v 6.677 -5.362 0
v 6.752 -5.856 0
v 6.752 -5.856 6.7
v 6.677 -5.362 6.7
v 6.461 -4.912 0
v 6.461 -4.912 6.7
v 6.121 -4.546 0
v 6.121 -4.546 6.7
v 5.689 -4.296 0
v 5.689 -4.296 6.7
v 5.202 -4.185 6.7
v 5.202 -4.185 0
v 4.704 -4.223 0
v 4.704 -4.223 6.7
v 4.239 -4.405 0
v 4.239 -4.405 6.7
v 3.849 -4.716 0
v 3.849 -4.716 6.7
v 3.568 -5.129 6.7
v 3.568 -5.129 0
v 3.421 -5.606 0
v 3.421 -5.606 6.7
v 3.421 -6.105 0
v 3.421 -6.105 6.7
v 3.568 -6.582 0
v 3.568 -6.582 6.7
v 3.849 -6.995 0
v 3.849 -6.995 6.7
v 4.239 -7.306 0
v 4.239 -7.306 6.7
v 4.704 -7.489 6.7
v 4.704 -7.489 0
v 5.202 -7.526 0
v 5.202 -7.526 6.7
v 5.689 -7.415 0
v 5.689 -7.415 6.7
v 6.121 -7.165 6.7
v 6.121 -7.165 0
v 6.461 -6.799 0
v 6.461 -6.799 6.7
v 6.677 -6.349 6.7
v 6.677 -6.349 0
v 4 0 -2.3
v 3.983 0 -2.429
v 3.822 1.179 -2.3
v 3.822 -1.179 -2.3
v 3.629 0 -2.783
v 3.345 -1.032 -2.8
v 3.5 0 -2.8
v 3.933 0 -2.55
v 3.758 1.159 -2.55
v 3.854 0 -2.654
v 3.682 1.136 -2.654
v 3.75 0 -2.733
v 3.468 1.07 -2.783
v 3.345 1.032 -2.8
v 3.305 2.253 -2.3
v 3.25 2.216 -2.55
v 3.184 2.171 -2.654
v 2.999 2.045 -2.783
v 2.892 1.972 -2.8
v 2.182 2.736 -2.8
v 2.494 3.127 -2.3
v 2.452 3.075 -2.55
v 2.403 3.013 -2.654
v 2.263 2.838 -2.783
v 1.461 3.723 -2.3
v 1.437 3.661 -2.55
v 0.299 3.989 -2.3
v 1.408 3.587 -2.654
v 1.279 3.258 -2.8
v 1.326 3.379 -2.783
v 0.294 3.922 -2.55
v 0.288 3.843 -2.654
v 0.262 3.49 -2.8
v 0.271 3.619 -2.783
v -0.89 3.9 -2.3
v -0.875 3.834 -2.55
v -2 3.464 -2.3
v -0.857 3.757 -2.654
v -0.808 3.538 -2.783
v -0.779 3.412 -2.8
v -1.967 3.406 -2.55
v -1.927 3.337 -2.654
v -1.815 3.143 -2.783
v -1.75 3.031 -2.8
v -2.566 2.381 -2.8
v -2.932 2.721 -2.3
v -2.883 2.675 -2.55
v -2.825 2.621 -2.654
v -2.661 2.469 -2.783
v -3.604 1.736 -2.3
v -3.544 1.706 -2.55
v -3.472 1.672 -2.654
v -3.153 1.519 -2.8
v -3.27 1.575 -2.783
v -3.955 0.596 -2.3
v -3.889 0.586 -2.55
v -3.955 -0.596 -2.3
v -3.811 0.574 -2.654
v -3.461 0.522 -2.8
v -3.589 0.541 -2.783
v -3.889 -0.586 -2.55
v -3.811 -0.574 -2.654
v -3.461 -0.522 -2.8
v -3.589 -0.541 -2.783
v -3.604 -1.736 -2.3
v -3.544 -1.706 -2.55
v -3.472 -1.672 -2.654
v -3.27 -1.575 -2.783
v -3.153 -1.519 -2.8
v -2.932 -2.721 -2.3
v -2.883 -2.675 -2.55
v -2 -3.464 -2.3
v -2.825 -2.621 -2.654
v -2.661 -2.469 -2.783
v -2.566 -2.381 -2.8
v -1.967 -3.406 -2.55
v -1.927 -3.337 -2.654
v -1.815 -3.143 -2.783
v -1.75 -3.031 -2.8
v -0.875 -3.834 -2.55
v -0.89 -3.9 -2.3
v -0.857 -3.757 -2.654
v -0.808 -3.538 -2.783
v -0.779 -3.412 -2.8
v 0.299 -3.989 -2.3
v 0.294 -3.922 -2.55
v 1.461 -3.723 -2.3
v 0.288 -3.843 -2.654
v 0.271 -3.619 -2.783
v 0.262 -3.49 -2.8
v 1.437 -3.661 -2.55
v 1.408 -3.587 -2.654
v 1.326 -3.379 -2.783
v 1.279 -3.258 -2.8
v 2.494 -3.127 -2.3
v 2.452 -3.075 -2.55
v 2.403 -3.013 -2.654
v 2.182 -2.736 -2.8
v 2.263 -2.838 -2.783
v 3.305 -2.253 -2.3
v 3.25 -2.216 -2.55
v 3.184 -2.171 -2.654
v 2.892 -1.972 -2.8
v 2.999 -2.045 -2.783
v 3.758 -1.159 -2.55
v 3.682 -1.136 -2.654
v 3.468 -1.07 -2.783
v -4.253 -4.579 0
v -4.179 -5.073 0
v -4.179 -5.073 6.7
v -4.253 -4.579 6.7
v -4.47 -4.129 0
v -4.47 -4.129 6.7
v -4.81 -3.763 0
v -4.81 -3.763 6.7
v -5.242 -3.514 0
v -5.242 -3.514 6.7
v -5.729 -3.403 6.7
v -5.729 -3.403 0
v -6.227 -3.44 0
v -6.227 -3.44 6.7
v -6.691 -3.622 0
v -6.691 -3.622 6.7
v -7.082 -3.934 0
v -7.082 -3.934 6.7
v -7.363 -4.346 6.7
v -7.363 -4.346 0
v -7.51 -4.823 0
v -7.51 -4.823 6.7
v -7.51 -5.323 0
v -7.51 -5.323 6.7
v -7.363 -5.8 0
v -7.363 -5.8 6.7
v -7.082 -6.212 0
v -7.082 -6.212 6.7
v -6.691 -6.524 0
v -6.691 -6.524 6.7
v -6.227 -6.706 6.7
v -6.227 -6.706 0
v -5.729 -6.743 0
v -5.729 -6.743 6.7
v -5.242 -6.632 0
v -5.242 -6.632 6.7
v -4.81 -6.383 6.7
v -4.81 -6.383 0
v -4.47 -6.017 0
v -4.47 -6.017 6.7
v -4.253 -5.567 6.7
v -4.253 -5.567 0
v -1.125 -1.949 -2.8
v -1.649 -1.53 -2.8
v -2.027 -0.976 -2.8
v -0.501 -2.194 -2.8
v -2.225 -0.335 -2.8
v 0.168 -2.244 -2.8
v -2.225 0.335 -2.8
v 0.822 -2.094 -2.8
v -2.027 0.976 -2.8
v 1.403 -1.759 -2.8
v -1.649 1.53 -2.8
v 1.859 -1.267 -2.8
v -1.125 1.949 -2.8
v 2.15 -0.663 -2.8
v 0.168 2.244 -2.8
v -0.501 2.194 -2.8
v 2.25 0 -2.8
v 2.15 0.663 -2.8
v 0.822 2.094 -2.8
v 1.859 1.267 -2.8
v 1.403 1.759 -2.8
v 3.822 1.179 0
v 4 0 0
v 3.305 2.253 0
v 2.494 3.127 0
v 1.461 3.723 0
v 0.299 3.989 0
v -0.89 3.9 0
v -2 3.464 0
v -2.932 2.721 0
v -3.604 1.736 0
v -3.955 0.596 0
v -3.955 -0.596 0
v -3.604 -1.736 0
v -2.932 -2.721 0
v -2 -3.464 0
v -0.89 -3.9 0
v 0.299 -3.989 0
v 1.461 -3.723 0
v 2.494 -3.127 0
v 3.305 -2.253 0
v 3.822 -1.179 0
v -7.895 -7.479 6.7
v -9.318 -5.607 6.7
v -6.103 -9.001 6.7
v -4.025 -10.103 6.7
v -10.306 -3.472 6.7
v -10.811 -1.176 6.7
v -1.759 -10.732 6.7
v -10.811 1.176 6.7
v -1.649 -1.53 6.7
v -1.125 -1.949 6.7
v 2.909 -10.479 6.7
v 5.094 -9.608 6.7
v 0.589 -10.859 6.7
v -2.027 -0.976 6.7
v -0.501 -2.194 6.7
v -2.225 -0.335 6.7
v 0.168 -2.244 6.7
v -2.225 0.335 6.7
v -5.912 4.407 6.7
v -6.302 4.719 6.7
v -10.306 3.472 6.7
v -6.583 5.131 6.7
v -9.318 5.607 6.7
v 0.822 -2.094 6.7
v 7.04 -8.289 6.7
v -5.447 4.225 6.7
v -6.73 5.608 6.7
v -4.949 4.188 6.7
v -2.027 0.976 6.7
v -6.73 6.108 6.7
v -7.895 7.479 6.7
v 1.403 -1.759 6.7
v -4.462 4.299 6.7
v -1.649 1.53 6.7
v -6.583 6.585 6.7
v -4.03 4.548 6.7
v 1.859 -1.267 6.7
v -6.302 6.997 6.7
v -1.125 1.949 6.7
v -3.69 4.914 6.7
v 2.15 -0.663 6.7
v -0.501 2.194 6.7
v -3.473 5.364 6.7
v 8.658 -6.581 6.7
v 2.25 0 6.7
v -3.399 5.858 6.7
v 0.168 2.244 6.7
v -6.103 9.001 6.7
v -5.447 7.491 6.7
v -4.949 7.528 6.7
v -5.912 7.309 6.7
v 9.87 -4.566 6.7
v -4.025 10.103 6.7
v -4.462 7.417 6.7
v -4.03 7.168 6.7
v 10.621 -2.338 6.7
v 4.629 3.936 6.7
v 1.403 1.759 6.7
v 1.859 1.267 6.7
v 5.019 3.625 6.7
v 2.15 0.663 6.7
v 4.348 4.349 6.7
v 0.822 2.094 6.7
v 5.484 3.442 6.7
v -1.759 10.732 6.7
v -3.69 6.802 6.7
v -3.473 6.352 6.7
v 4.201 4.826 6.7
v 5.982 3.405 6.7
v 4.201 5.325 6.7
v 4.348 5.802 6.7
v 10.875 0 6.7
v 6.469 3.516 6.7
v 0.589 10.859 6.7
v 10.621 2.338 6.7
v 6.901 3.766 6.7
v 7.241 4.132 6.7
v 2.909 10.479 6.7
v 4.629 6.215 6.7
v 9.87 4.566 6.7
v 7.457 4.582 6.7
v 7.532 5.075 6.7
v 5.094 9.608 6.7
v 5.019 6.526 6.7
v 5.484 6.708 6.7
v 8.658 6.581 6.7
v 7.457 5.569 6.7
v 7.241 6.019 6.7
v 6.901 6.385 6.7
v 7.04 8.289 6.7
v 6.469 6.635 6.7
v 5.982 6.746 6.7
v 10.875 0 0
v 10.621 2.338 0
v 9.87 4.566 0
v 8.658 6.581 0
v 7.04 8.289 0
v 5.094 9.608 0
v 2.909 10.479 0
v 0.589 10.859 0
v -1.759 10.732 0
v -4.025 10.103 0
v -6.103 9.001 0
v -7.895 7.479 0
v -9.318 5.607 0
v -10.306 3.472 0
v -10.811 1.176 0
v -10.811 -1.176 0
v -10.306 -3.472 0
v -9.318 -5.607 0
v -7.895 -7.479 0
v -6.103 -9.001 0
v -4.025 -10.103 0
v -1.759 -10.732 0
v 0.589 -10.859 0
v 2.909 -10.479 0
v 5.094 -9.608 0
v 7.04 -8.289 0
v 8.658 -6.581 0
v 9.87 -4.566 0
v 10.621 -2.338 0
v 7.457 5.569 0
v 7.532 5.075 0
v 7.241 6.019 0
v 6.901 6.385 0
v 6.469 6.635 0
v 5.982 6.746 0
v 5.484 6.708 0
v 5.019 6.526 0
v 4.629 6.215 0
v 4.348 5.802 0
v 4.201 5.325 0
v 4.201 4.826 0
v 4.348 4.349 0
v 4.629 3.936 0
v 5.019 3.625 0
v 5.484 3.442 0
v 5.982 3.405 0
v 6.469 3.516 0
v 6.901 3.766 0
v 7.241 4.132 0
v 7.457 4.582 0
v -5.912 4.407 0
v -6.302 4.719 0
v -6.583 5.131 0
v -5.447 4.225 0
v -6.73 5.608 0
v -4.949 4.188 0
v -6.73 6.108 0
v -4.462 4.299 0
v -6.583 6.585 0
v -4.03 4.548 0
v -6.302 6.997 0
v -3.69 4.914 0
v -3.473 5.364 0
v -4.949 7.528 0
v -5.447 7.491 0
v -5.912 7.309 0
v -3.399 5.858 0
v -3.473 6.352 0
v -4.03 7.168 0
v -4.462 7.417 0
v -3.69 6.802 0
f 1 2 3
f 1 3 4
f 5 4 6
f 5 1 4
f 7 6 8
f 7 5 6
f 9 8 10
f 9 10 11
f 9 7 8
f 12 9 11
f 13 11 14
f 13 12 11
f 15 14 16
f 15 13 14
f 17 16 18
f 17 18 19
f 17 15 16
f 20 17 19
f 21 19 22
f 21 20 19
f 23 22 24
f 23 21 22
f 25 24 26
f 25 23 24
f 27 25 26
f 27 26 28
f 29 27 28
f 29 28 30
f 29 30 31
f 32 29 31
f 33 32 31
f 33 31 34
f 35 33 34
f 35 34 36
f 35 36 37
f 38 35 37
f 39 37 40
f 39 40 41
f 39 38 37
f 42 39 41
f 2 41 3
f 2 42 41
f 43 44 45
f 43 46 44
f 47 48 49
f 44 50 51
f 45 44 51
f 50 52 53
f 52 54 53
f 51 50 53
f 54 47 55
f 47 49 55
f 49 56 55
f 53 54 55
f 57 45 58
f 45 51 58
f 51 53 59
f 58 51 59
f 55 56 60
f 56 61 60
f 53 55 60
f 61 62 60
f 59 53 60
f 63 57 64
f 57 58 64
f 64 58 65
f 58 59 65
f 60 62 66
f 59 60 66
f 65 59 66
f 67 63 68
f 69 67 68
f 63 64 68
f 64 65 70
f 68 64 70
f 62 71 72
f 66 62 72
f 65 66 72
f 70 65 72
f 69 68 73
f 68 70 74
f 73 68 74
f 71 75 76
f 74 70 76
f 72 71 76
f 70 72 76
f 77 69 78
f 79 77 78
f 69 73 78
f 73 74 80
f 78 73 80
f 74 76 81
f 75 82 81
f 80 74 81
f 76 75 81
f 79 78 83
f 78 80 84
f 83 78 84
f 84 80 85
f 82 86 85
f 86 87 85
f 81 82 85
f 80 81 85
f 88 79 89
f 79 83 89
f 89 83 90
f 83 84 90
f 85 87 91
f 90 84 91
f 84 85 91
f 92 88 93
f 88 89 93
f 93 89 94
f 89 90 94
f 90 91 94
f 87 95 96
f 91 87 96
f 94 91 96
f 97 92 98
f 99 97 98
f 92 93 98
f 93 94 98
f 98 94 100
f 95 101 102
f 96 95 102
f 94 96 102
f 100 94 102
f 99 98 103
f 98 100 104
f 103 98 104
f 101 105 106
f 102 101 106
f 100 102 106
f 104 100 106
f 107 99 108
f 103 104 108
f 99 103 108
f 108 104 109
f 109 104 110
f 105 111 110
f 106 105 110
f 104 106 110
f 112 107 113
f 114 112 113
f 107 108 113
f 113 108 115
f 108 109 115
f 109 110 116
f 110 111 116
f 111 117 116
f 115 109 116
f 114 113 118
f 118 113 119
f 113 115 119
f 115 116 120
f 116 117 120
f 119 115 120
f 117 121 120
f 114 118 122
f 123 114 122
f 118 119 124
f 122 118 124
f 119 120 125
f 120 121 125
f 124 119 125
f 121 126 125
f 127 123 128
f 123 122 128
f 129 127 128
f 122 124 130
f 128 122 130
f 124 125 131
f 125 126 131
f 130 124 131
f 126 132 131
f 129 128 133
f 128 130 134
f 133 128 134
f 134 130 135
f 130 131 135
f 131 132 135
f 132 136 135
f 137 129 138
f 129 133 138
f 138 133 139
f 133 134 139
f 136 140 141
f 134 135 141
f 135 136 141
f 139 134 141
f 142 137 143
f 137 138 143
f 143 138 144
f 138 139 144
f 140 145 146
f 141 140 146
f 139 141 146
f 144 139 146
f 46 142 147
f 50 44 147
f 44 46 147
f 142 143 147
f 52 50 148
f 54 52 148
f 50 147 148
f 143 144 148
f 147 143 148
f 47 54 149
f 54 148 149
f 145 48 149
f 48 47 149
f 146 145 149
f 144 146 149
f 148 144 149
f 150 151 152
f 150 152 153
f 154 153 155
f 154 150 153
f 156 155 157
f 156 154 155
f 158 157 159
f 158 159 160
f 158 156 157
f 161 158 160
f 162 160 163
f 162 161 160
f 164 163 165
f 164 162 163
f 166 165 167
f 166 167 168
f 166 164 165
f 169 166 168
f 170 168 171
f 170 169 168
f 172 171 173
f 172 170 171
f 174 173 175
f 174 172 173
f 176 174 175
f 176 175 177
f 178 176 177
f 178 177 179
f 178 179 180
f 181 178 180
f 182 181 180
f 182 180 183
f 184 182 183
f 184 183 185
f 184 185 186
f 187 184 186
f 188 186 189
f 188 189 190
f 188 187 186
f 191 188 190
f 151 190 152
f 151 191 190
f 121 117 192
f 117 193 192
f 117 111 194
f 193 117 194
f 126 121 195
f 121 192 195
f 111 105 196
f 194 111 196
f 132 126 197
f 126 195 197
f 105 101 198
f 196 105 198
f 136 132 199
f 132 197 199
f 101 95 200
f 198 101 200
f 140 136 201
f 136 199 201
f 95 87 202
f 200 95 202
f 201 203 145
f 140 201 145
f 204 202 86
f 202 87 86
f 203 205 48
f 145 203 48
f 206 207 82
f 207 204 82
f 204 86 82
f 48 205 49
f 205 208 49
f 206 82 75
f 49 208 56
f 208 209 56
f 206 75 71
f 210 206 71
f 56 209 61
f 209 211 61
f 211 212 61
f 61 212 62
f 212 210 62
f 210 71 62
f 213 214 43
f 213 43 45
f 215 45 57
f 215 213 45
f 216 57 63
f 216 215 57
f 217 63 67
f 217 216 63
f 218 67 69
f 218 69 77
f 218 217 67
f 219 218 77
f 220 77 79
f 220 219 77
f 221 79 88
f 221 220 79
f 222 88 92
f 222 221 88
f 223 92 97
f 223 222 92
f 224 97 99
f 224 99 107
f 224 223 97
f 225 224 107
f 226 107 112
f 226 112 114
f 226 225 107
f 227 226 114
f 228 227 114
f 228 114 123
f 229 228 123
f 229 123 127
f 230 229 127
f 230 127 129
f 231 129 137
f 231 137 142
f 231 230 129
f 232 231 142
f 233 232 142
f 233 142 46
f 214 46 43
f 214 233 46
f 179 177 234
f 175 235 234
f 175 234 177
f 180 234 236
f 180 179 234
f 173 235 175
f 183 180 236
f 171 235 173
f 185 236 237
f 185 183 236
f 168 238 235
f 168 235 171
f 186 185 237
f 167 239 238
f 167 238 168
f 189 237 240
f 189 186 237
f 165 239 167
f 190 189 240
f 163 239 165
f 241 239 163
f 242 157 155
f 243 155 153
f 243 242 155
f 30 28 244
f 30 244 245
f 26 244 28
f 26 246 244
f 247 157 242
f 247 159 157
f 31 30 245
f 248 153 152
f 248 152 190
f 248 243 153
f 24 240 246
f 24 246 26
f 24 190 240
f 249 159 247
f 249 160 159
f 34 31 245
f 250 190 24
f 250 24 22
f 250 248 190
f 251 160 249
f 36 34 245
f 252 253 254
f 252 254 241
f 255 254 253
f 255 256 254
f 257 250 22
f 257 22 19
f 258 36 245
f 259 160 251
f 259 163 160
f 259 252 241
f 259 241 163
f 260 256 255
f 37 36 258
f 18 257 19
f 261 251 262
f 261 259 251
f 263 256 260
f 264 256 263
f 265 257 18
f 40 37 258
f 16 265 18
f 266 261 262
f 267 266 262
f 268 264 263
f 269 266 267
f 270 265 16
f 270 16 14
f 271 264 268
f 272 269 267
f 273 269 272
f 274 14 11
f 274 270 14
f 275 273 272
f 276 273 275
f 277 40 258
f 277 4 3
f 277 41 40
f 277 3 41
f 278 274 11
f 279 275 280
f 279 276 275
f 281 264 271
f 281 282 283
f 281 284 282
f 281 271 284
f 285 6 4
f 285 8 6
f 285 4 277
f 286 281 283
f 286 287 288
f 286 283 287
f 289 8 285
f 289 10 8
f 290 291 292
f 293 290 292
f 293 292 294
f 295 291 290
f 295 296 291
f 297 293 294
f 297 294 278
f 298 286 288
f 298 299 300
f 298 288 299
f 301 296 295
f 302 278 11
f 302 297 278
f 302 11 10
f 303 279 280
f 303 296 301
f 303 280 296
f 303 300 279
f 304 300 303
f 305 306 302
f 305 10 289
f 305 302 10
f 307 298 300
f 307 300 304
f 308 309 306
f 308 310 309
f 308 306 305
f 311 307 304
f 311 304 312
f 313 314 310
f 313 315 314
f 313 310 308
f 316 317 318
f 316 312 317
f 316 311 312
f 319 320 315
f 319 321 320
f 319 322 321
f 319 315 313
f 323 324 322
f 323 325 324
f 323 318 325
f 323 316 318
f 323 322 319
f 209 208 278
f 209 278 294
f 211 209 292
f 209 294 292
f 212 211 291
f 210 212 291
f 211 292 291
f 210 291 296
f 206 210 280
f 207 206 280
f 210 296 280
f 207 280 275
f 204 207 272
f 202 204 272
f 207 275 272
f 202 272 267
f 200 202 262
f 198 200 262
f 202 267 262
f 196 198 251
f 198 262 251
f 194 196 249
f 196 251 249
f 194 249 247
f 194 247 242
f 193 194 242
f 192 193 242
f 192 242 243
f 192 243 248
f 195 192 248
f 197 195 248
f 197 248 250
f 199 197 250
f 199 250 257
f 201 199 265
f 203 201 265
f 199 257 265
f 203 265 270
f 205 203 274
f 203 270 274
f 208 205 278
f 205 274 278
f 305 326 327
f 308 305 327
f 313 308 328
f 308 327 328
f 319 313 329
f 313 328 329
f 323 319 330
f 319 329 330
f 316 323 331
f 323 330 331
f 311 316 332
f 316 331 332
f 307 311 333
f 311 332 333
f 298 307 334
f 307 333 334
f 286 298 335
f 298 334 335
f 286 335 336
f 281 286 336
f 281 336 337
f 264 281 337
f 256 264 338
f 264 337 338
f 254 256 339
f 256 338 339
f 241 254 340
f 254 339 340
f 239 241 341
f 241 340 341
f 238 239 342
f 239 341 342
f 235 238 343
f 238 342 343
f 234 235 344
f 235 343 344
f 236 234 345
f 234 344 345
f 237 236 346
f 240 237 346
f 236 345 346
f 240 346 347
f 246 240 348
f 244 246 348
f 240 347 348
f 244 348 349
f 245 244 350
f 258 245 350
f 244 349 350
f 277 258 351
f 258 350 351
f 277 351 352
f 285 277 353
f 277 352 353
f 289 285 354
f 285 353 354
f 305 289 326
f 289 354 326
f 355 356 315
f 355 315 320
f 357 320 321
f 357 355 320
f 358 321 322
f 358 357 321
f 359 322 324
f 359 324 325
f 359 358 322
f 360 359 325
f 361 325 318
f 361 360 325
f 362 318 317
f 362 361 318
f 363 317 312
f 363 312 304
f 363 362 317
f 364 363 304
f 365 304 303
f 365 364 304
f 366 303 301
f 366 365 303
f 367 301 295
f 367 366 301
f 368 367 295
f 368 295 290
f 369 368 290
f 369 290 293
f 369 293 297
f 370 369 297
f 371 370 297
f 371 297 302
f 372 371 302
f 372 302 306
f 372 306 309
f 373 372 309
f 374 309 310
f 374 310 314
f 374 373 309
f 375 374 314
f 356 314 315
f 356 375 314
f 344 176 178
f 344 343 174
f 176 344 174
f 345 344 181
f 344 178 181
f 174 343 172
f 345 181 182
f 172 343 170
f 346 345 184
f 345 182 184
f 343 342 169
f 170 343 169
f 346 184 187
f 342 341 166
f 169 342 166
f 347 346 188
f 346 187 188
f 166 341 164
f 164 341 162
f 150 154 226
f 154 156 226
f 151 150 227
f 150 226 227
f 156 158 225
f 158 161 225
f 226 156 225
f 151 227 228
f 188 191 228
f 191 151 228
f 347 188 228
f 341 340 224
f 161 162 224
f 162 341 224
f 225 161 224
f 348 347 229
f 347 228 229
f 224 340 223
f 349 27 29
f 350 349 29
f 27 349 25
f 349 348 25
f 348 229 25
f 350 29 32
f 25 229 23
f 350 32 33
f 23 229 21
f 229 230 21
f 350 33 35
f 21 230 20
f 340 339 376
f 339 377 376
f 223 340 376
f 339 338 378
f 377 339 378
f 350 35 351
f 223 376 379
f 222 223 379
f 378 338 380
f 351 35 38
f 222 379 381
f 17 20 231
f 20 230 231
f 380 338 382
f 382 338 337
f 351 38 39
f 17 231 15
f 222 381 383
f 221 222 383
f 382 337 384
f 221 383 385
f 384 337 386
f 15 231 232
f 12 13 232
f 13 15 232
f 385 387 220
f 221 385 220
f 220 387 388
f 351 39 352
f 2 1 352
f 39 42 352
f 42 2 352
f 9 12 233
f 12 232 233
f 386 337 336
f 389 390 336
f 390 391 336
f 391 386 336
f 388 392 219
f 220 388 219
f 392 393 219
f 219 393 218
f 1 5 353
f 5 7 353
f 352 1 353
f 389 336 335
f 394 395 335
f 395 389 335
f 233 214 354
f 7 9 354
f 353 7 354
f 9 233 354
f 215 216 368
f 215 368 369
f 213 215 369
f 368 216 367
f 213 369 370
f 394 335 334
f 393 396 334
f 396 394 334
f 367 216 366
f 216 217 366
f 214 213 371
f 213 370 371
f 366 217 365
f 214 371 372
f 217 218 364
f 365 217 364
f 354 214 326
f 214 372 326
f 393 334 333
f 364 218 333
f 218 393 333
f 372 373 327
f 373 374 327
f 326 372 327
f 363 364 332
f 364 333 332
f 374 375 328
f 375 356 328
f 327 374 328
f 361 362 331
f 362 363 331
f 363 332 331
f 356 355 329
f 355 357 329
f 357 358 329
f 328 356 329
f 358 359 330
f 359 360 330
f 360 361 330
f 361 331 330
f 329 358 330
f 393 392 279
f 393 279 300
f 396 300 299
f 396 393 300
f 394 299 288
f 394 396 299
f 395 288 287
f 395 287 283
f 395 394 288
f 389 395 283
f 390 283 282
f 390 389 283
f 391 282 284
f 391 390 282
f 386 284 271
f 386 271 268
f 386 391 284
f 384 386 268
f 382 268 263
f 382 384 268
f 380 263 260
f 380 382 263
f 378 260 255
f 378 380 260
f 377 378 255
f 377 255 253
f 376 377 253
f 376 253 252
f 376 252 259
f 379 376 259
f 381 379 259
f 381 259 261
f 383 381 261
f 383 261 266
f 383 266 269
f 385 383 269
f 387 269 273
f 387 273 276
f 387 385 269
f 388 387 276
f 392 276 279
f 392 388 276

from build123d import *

# Parameters (mm, degrees)
F0_R     = 10.875
F0_R_2   = 1.675
F1_DEPTH = 6.7
F2_R     = 4
F3_DEPTH = 2.8
F4_R     = 2.25
F5_DEPTH = 12.5
F6_R     = 0.5


with BuildPart() as f1:
    # F0 (on Top) → F1 (new body)
    with BuildSketch(Plane.XY):
        Circle(F0_R)
        with Locations((-5.853981, -5.072985)):
            Circle(F0_R_2, mode=Mode.SUBTRACT)
        with Locations((5.076866, -5.85559)):
            Circle(F0_R_2, mode=Mode.SUBTRACT)
        with Locations((-5.074026, 5.858051)):
            Circle(F0_R_2, mode=Mode.SUBTRACT)
        with Locations((5.856821, 5.075446)):
            Circle(F0_R_2, mode=Mode.SUBTRACT)
    extrude(amount=F1_DEPTH)

    # F2 (on Top) → F3 (join)
    with BuildSketch(Plane.XY):
        Circle(F2_R)
    extrude(amount=-F3_DEPTH)

    # F4 (on Top) → F5 (cut, symmetric)
    with BuildSketch(Plane.XY):
        Circle(F4_R)
    extrude(amount=F5_DEPTH, both=True, mode=Mode.SUBTRACT)

    # F6
    f6_edges = [f1.edges().sort_by_distance(p)[0] for p in [
        (-4, 0, -2.8),
    ]]
    fillet(f6_edges, radius=F6_R)


solid = f1.part
